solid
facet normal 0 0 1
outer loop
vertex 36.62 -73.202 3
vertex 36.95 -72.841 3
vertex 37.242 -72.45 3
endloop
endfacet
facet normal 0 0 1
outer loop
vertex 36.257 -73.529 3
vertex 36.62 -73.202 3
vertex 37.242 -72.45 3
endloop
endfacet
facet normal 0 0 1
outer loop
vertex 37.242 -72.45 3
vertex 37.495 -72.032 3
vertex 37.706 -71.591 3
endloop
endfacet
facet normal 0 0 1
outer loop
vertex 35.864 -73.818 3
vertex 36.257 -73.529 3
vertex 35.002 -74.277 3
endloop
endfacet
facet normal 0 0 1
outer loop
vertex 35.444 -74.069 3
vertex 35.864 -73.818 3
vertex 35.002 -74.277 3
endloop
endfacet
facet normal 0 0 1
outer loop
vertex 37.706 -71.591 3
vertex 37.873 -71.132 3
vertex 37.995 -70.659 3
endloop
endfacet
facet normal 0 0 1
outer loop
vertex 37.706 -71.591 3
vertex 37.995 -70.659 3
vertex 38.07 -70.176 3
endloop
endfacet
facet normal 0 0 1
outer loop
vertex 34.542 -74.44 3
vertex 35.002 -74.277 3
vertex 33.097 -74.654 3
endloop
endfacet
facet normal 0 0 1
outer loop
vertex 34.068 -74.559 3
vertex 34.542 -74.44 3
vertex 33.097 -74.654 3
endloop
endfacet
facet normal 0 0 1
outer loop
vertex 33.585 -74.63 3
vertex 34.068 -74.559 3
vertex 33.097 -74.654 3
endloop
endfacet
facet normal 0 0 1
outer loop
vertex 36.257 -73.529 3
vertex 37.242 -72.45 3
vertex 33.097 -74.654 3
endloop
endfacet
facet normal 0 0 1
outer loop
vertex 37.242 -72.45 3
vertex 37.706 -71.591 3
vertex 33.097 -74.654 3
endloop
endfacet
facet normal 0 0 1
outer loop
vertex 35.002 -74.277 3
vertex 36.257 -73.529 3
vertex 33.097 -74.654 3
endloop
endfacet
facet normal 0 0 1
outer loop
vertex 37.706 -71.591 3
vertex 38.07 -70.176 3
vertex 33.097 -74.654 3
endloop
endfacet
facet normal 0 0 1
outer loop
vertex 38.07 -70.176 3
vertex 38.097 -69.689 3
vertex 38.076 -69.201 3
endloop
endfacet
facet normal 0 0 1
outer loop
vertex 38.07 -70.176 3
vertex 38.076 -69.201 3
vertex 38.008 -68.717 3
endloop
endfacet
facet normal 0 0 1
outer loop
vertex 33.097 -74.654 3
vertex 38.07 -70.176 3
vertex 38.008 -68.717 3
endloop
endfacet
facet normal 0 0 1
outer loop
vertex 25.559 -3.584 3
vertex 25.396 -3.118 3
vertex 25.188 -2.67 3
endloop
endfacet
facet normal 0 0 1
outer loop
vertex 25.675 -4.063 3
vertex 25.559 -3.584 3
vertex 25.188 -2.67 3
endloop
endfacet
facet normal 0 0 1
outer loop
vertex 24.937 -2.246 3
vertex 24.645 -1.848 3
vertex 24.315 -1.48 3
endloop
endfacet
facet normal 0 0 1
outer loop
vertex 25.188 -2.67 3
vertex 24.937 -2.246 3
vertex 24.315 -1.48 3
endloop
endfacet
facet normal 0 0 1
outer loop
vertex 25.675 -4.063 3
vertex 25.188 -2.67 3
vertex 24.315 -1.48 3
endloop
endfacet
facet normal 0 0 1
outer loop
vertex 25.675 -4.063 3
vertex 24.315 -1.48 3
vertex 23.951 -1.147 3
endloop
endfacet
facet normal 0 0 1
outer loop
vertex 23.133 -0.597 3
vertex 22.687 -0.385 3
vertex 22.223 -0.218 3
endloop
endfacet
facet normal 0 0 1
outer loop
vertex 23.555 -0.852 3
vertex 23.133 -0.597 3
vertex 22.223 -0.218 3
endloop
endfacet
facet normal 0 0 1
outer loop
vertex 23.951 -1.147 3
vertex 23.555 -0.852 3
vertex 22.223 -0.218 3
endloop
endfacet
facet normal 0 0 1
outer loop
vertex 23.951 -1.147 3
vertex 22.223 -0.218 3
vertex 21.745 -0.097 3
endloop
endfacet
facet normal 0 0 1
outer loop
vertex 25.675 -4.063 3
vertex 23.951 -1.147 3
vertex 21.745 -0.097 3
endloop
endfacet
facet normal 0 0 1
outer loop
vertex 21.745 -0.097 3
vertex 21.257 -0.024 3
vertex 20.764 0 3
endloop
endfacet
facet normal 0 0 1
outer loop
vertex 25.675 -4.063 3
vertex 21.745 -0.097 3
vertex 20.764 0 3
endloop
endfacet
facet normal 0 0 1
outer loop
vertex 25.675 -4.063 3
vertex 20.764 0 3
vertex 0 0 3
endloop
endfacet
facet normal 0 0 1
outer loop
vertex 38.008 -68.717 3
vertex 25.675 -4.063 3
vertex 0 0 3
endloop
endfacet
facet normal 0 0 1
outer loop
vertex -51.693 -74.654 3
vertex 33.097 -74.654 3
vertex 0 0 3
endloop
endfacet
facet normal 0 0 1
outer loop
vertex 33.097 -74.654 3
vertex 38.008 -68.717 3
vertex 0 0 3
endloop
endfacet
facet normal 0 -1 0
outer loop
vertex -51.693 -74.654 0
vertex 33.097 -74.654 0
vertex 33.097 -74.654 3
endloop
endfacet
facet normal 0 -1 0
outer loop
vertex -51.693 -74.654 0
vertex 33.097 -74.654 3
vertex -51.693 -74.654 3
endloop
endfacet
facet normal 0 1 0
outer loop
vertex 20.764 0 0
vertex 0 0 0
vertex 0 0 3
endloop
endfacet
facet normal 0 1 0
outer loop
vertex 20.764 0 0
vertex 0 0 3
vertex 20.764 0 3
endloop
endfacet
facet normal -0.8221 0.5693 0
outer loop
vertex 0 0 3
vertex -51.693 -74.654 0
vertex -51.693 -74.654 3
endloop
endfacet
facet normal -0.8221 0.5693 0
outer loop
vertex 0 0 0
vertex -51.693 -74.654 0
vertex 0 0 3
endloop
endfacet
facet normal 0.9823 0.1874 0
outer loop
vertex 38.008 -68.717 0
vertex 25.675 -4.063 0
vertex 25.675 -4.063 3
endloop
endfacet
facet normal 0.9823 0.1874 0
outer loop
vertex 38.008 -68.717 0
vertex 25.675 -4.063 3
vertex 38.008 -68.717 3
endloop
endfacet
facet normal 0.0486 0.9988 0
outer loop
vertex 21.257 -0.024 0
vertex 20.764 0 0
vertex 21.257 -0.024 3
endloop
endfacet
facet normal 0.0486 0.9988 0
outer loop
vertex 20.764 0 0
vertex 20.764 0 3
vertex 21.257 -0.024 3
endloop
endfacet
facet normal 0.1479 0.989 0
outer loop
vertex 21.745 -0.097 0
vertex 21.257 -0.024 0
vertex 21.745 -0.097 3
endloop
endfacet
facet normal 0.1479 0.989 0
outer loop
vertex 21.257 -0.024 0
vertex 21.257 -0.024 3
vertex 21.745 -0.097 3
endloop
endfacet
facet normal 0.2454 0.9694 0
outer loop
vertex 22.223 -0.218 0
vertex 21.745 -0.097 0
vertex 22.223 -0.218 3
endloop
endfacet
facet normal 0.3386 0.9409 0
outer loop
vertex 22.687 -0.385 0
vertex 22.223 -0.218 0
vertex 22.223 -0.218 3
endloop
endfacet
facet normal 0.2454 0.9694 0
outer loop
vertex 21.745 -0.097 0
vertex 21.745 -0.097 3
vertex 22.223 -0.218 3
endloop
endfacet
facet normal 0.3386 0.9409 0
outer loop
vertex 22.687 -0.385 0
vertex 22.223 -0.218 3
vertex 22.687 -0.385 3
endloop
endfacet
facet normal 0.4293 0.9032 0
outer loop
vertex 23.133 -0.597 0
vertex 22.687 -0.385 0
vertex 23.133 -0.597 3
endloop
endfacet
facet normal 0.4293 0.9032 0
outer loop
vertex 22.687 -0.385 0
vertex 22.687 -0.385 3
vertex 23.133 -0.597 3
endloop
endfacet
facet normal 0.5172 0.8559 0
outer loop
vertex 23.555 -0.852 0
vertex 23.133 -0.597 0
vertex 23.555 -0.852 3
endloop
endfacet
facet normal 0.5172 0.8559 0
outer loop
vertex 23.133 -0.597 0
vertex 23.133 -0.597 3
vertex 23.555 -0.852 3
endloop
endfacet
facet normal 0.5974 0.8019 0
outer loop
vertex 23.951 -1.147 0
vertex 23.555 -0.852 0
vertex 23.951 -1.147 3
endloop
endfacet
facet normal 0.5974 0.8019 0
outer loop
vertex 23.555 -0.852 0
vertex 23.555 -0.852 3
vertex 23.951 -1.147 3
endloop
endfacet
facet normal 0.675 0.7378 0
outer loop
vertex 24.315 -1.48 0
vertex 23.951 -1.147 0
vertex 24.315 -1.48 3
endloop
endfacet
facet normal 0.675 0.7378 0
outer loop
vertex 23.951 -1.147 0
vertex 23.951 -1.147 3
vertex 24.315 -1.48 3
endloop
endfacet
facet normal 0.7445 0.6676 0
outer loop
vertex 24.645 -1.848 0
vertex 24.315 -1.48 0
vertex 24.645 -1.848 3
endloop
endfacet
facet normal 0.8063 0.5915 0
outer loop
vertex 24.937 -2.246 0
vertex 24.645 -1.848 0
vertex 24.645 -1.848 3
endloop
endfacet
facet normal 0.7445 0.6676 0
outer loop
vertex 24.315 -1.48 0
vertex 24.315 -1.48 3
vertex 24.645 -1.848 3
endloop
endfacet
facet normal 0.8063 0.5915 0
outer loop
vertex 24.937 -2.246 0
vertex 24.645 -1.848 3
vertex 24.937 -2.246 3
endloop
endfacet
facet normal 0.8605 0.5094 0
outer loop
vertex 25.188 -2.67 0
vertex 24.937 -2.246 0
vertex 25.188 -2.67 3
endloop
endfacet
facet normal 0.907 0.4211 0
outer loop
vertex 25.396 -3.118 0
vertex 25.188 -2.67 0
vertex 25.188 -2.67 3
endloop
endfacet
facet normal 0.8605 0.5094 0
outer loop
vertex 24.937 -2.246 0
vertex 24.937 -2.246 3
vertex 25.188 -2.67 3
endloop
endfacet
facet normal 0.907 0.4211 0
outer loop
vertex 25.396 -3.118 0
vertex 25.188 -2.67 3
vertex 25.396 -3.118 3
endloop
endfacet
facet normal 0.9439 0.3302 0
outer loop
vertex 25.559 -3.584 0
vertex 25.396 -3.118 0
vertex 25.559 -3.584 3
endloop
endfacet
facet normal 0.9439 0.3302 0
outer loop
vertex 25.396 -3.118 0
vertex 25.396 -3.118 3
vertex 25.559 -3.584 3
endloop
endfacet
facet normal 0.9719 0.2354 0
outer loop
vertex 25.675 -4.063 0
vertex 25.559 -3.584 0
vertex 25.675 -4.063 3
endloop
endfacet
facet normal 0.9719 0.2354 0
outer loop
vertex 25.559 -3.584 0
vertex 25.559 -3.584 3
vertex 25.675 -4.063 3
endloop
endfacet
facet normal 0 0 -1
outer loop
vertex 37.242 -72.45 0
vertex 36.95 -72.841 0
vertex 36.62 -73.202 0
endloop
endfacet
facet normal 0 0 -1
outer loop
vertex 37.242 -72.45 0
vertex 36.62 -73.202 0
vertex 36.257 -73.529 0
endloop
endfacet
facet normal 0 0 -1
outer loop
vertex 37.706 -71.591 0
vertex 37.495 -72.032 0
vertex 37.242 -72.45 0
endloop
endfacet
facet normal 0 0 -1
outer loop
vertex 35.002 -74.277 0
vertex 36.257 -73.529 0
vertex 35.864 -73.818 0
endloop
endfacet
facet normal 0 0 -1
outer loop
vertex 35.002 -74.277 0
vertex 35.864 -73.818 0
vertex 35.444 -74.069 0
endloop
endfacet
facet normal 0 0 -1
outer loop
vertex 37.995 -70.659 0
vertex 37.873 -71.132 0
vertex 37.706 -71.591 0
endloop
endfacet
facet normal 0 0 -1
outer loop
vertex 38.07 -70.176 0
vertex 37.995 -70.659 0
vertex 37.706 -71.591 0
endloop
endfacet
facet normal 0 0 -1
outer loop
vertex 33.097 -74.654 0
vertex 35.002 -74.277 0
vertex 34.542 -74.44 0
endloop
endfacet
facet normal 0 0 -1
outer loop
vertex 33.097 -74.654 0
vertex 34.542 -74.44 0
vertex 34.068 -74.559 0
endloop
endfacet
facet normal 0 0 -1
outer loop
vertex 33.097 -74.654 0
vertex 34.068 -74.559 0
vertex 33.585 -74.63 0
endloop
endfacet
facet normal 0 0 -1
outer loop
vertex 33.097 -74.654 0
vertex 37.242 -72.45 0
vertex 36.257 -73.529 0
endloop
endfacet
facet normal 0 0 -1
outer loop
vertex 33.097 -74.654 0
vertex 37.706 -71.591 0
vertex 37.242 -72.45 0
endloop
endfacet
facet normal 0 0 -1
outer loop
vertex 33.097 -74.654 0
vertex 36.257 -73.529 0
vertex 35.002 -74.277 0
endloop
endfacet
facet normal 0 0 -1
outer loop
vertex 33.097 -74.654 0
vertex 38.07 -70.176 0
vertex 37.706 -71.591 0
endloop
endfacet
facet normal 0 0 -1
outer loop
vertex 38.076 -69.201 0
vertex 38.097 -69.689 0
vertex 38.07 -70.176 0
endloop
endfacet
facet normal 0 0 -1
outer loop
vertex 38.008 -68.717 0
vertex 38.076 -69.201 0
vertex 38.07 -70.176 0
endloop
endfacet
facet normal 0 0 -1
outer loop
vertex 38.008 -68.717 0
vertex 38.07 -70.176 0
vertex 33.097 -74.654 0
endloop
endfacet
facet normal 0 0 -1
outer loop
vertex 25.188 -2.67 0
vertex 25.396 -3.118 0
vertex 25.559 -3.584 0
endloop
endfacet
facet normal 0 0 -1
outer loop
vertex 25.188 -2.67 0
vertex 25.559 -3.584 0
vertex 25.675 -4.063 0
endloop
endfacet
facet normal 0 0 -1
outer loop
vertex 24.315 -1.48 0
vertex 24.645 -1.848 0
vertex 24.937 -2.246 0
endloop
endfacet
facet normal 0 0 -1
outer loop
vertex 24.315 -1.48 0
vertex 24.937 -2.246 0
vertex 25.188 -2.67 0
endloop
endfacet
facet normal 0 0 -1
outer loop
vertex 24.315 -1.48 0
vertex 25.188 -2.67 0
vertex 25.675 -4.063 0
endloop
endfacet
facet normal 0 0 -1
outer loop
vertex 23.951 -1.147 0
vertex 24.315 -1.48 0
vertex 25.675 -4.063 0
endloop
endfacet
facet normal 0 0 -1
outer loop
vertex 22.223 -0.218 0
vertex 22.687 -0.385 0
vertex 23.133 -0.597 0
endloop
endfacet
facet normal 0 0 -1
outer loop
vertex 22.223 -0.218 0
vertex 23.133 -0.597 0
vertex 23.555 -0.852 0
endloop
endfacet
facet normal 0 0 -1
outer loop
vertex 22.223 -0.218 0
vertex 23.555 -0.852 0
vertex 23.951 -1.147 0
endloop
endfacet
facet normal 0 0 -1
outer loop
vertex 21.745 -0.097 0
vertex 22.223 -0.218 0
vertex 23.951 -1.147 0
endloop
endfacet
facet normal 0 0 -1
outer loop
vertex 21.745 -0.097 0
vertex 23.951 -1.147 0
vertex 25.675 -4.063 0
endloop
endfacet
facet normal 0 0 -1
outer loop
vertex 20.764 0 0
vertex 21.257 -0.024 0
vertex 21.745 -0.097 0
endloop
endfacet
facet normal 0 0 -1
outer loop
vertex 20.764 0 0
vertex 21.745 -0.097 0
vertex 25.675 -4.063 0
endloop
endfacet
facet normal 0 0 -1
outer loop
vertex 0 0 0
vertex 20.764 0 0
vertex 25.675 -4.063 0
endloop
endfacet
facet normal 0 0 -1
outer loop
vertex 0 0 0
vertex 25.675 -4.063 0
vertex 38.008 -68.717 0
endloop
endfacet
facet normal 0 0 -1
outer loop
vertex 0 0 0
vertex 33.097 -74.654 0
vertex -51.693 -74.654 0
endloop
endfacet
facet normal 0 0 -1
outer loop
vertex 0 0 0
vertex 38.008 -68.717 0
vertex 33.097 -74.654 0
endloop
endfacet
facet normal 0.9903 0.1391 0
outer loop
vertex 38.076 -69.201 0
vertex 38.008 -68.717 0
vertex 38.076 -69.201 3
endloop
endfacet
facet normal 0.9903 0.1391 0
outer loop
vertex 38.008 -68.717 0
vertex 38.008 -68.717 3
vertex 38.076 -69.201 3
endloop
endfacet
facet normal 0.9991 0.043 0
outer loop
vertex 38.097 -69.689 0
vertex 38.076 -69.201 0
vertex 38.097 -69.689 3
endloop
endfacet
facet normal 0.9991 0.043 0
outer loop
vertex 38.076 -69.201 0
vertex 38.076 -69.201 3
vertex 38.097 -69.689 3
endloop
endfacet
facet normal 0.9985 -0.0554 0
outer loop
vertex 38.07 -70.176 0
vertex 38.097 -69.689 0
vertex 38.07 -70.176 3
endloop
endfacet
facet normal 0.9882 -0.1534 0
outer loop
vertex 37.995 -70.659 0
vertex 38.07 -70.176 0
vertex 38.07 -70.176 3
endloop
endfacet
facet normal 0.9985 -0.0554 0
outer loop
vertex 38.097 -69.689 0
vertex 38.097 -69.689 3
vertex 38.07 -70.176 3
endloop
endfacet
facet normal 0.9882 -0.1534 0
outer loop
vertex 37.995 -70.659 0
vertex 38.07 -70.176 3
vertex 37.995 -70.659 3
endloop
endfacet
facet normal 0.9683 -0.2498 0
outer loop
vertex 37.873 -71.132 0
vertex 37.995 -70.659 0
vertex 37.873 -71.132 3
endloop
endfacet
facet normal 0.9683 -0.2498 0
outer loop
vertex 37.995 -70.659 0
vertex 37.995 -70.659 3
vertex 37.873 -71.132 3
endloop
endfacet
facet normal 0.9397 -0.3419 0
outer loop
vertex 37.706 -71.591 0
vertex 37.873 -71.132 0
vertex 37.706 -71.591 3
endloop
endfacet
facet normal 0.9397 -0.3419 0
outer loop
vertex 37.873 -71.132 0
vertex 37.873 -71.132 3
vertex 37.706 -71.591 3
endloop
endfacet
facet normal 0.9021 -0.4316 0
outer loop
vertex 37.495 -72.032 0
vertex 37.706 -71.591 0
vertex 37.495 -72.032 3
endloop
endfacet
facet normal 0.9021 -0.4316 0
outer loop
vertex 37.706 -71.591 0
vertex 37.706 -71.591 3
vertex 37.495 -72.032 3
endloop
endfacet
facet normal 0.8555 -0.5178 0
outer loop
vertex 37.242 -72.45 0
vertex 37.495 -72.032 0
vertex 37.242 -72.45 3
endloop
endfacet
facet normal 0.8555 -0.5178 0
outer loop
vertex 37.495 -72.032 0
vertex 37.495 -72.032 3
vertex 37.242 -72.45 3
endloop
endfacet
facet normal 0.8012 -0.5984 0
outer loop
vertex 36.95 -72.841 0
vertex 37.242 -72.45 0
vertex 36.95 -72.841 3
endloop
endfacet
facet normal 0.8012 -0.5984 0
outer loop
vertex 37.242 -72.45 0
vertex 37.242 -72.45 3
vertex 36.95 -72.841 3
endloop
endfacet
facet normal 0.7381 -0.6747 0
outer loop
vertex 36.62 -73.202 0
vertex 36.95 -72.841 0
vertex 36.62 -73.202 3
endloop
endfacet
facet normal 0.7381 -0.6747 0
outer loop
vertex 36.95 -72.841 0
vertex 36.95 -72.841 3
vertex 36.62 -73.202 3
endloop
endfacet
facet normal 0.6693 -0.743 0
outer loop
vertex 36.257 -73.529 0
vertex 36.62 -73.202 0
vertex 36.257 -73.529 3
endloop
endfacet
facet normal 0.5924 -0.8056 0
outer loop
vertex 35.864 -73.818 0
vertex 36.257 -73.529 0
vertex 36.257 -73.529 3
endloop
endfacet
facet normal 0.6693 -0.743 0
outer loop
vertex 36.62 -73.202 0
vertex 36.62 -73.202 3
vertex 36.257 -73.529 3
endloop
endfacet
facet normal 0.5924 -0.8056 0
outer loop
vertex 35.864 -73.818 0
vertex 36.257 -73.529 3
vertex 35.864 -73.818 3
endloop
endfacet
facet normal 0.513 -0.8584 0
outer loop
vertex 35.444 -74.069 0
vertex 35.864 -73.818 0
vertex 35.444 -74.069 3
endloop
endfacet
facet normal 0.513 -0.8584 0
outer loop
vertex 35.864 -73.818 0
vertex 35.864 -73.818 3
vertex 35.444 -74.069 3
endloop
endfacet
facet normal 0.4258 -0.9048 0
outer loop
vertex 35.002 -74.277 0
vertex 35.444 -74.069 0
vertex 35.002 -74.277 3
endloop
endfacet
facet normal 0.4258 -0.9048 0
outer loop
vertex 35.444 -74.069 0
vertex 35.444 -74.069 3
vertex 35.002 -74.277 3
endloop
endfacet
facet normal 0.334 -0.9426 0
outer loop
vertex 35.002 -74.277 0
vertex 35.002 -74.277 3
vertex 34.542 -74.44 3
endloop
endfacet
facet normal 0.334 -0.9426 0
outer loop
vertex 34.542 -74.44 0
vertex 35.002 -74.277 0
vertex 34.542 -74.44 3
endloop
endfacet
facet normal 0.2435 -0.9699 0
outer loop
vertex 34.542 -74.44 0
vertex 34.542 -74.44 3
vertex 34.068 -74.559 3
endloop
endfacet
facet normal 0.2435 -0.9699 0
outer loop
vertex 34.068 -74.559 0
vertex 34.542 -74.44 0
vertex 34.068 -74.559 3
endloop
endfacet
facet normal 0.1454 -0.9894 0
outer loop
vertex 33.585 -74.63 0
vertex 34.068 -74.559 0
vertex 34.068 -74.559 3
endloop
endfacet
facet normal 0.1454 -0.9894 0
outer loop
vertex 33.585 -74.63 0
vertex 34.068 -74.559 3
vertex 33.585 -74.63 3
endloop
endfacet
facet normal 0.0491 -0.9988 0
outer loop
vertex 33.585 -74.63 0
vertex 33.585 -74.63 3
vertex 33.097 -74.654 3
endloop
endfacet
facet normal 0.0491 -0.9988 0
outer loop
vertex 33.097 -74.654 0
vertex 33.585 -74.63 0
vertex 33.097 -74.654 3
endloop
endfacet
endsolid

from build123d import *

# Parameters (mm, degrees)
RESSALTO_EXTRUS_O1_DEPTH = 3
FILETE1_R                = 5


with BuildPart() as part:
    # Esboço1 → Ressalto-extrusão1 (new body)
    with BuildSketch(Plane.XY):
        Polygon((0, 0), (24.9, 0), (39.140979909, -74.653831055), (-51.692763366, -74.653831055), align=None)
    extrude(amount=RESSALTO_EXTRUS_O1_DEPTH)

    # Filete1
    filete1_edges = [part.edges().sort_by_distance(p)[0] for p in [
        (24.9, 0, 1.5),
        (39.140979909, -74.653831055, 1.5),
    ]]
    fillet(filete1_edges, radius=FILETE1_R)


solid = part.part
